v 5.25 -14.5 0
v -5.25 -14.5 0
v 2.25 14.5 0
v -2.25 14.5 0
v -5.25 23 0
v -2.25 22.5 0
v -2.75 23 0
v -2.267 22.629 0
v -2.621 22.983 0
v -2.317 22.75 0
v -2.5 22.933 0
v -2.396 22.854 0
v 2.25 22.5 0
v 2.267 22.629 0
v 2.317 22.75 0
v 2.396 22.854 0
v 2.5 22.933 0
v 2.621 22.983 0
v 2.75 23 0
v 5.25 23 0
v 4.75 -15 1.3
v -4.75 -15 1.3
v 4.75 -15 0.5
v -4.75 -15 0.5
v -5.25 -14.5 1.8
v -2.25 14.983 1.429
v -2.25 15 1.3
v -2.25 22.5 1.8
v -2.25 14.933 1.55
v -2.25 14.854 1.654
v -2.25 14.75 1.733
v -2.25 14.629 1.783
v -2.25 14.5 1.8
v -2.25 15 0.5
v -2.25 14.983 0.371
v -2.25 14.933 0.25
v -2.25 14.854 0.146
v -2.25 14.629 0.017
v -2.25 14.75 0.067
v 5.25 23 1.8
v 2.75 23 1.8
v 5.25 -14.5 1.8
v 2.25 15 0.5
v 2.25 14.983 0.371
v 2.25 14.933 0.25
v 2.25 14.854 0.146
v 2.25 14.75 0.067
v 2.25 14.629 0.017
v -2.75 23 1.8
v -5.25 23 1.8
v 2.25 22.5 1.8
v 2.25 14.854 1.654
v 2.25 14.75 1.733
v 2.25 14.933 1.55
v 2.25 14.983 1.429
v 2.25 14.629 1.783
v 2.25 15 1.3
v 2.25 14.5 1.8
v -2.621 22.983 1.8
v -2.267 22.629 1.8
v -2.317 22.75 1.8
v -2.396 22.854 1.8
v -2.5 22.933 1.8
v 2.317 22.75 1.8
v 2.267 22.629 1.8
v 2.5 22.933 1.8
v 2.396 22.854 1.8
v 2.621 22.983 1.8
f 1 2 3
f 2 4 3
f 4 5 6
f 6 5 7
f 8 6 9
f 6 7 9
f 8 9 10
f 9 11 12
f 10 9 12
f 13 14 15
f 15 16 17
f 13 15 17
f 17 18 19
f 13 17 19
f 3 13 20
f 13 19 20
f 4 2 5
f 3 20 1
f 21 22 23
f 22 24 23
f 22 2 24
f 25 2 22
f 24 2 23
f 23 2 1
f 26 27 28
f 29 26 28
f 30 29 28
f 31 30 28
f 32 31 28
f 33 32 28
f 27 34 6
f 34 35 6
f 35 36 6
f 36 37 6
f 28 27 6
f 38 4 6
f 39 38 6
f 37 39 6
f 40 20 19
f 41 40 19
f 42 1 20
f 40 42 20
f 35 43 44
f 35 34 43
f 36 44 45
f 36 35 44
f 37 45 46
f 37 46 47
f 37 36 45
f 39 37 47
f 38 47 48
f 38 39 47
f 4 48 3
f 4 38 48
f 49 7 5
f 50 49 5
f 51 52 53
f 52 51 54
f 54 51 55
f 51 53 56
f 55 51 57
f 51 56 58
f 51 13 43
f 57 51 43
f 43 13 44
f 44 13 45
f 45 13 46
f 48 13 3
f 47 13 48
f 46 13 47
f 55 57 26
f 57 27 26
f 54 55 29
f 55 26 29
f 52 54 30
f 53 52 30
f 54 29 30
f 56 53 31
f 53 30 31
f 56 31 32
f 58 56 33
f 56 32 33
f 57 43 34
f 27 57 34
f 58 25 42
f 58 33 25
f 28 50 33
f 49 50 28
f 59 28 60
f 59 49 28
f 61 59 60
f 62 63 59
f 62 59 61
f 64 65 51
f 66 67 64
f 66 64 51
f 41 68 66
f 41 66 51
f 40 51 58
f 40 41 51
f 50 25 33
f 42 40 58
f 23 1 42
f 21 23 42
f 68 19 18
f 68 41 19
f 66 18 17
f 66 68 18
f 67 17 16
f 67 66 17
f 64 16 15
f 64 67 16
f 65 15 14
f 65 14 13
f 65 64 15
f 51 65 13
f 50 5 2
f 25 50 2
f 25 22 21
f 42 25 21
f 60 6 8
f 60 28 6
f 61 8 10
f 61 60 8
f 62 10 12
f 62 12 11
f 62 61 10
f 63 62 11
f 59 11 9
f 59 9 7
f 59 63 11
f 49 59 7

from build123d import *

# Parameters (mm, degrees)
F1_DEPTH = 1.8
F2_R     = 0.5
F3_SIZE  = 0.5


with BuildPart() as f1:
    # F0 (on Top) → F1 (new body)
    with BuildSketch(Plane.XY):
        Polygon((-5.25, -15), (5.25, -15), (5.25, 15), (5.25, 23), (2.25, 23), (2.25, 15), (-2.25, 15), (-2.25, 23), (-5.25, 23), (-5.25, 15), align=None)
    extrude(amount=F1_DEPTH)

    # F2
    f2_edges = [f1.edges().sort_by_distance(p)[0] for p in [
        (-2.25, 23, 0.9),
        (2.25, 23, 0.9),
        (0, 15, 1.8),
        (0, 15, 0),
    ]]
    fillet(f2_edges, radius=F2_R)

    # F3
    f3_edges = [f1.edges().sort_by_distance(p)[0] for p in [
        (0, -15, 1.8),
        (5.25, -15, 0.9),
        (0, -15, 0),
        (-5.25, -15, 0.9),
    ]]
    chamfer(f3_edges, length=F3_SIZE)


solid = f1.part
